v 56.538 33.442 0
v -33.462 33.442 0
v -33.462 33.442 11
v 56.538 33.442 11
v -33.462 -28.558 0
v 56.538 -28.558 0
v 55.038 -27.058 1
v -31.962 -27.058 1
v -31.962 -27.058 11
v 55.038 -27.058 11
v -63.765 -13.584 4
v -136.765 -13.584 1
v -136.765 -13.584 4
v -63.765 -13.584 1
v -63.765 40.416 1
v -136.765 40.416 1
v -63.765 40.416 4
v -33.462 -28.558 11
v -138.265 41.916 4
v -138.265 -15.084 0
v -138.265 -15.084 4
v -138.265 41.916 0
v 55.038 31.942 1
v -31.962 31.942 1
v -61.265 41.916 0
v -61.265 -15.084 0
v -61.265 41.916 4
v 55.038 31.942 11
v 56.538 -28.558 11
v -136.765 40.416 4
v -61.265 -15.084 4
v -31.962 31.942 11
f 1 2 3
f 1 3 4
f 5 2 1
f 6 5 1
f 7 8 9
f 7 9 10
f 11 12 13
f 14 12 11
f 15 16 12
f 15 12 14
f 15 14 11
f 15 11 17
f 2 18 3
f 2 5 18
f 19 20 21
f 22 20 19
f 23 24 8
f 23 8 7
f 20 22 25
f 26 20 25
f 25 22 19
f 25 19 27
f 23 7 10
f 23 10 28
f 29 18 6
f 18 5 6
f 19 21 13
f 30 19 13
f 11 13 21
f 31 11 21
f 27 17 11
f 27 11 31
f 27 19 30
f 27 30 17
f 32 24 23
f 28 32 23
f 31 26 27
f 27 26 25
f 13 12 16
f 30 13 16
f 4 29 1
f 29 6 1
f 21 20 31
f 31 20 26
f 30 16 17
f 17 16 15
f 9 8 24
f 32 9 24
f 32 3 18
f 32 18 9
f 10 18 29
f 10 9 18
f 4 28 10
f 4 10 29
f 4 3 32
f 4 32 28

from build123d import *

# Parameters (mm, degrees)
F0_W     = 90
F0_H     = 62
F0_W_2   = 87
F0_H_2   = 59
F1_DEPTH = 1
F2_W     = 90
F2_H     = 62
F2_W_2   = 87
F2_H_2   = 59
F3_DEPTH = 10
F4_W     = 77
F4_H     = 57
F5_DEPTH = 1
F6_W     = 77
F6_H     = 57
F6_W_2   = 73
F6_H_2   = 54
F7_DEPTH = 3


with BuildPart() as f1:
    # F0 (on Top) → F1 (new body)
    with BuildSketch(Plane.XY):
        with Locations((11.5384590626, 2.4423064142)):
            Rectangle(F0_W, F0_H)
        with Locations((11.5384590626, 2.4423064142)):
            Rectangle(F0_W_2, F0_H_2, mode=Mode.SUBTRACT)
        with Locations((11.5384590626, 2.4423064142)):
            Rectangle(F0_W_2, F0_H_2)
    extrude(amount=F1_DEPTH)

    # F2 (on face) → F3 (join)
    with BuildSketch(Plane.XY.offset(1)):
        with Locations((11.5384590626, 2.4423064142)):
            Rectangle(F2_W, F2_H)
        with Locations((11.5384590626, 2.4423064142)):
            Rectangle(F2_W_2, F2_H_2, mode=Mode.SUBTRACT)
    extrude(amount=F3_DEPTH)


with BuildPart() as f5:
    # F4 (on Top) → F5 (new body)
    with BuildSketch(Plane.XY):
        with Locations((-99.7649838924, 13.4157538265)):
            Rectangle(F4_W, F4_H)
    extrude(amount=F5_DEPTH)

    # F6 (on face) → F7 (join)
    with BuildSketch(Plane.XY.offset(1)):
        with Locations((-99.7649838924, 13.4157538265)):
            Rectangle(F6_W, F6_H)
        with Locations((-100.2649838924, 13.4157538265)):
            Rectangle(F6_W_2, F6_H_2, mode=Mode.SUBTRACT)
    extrude(amount=F7_DEPTH)


solid = Compound([f1.part, f5.part])
